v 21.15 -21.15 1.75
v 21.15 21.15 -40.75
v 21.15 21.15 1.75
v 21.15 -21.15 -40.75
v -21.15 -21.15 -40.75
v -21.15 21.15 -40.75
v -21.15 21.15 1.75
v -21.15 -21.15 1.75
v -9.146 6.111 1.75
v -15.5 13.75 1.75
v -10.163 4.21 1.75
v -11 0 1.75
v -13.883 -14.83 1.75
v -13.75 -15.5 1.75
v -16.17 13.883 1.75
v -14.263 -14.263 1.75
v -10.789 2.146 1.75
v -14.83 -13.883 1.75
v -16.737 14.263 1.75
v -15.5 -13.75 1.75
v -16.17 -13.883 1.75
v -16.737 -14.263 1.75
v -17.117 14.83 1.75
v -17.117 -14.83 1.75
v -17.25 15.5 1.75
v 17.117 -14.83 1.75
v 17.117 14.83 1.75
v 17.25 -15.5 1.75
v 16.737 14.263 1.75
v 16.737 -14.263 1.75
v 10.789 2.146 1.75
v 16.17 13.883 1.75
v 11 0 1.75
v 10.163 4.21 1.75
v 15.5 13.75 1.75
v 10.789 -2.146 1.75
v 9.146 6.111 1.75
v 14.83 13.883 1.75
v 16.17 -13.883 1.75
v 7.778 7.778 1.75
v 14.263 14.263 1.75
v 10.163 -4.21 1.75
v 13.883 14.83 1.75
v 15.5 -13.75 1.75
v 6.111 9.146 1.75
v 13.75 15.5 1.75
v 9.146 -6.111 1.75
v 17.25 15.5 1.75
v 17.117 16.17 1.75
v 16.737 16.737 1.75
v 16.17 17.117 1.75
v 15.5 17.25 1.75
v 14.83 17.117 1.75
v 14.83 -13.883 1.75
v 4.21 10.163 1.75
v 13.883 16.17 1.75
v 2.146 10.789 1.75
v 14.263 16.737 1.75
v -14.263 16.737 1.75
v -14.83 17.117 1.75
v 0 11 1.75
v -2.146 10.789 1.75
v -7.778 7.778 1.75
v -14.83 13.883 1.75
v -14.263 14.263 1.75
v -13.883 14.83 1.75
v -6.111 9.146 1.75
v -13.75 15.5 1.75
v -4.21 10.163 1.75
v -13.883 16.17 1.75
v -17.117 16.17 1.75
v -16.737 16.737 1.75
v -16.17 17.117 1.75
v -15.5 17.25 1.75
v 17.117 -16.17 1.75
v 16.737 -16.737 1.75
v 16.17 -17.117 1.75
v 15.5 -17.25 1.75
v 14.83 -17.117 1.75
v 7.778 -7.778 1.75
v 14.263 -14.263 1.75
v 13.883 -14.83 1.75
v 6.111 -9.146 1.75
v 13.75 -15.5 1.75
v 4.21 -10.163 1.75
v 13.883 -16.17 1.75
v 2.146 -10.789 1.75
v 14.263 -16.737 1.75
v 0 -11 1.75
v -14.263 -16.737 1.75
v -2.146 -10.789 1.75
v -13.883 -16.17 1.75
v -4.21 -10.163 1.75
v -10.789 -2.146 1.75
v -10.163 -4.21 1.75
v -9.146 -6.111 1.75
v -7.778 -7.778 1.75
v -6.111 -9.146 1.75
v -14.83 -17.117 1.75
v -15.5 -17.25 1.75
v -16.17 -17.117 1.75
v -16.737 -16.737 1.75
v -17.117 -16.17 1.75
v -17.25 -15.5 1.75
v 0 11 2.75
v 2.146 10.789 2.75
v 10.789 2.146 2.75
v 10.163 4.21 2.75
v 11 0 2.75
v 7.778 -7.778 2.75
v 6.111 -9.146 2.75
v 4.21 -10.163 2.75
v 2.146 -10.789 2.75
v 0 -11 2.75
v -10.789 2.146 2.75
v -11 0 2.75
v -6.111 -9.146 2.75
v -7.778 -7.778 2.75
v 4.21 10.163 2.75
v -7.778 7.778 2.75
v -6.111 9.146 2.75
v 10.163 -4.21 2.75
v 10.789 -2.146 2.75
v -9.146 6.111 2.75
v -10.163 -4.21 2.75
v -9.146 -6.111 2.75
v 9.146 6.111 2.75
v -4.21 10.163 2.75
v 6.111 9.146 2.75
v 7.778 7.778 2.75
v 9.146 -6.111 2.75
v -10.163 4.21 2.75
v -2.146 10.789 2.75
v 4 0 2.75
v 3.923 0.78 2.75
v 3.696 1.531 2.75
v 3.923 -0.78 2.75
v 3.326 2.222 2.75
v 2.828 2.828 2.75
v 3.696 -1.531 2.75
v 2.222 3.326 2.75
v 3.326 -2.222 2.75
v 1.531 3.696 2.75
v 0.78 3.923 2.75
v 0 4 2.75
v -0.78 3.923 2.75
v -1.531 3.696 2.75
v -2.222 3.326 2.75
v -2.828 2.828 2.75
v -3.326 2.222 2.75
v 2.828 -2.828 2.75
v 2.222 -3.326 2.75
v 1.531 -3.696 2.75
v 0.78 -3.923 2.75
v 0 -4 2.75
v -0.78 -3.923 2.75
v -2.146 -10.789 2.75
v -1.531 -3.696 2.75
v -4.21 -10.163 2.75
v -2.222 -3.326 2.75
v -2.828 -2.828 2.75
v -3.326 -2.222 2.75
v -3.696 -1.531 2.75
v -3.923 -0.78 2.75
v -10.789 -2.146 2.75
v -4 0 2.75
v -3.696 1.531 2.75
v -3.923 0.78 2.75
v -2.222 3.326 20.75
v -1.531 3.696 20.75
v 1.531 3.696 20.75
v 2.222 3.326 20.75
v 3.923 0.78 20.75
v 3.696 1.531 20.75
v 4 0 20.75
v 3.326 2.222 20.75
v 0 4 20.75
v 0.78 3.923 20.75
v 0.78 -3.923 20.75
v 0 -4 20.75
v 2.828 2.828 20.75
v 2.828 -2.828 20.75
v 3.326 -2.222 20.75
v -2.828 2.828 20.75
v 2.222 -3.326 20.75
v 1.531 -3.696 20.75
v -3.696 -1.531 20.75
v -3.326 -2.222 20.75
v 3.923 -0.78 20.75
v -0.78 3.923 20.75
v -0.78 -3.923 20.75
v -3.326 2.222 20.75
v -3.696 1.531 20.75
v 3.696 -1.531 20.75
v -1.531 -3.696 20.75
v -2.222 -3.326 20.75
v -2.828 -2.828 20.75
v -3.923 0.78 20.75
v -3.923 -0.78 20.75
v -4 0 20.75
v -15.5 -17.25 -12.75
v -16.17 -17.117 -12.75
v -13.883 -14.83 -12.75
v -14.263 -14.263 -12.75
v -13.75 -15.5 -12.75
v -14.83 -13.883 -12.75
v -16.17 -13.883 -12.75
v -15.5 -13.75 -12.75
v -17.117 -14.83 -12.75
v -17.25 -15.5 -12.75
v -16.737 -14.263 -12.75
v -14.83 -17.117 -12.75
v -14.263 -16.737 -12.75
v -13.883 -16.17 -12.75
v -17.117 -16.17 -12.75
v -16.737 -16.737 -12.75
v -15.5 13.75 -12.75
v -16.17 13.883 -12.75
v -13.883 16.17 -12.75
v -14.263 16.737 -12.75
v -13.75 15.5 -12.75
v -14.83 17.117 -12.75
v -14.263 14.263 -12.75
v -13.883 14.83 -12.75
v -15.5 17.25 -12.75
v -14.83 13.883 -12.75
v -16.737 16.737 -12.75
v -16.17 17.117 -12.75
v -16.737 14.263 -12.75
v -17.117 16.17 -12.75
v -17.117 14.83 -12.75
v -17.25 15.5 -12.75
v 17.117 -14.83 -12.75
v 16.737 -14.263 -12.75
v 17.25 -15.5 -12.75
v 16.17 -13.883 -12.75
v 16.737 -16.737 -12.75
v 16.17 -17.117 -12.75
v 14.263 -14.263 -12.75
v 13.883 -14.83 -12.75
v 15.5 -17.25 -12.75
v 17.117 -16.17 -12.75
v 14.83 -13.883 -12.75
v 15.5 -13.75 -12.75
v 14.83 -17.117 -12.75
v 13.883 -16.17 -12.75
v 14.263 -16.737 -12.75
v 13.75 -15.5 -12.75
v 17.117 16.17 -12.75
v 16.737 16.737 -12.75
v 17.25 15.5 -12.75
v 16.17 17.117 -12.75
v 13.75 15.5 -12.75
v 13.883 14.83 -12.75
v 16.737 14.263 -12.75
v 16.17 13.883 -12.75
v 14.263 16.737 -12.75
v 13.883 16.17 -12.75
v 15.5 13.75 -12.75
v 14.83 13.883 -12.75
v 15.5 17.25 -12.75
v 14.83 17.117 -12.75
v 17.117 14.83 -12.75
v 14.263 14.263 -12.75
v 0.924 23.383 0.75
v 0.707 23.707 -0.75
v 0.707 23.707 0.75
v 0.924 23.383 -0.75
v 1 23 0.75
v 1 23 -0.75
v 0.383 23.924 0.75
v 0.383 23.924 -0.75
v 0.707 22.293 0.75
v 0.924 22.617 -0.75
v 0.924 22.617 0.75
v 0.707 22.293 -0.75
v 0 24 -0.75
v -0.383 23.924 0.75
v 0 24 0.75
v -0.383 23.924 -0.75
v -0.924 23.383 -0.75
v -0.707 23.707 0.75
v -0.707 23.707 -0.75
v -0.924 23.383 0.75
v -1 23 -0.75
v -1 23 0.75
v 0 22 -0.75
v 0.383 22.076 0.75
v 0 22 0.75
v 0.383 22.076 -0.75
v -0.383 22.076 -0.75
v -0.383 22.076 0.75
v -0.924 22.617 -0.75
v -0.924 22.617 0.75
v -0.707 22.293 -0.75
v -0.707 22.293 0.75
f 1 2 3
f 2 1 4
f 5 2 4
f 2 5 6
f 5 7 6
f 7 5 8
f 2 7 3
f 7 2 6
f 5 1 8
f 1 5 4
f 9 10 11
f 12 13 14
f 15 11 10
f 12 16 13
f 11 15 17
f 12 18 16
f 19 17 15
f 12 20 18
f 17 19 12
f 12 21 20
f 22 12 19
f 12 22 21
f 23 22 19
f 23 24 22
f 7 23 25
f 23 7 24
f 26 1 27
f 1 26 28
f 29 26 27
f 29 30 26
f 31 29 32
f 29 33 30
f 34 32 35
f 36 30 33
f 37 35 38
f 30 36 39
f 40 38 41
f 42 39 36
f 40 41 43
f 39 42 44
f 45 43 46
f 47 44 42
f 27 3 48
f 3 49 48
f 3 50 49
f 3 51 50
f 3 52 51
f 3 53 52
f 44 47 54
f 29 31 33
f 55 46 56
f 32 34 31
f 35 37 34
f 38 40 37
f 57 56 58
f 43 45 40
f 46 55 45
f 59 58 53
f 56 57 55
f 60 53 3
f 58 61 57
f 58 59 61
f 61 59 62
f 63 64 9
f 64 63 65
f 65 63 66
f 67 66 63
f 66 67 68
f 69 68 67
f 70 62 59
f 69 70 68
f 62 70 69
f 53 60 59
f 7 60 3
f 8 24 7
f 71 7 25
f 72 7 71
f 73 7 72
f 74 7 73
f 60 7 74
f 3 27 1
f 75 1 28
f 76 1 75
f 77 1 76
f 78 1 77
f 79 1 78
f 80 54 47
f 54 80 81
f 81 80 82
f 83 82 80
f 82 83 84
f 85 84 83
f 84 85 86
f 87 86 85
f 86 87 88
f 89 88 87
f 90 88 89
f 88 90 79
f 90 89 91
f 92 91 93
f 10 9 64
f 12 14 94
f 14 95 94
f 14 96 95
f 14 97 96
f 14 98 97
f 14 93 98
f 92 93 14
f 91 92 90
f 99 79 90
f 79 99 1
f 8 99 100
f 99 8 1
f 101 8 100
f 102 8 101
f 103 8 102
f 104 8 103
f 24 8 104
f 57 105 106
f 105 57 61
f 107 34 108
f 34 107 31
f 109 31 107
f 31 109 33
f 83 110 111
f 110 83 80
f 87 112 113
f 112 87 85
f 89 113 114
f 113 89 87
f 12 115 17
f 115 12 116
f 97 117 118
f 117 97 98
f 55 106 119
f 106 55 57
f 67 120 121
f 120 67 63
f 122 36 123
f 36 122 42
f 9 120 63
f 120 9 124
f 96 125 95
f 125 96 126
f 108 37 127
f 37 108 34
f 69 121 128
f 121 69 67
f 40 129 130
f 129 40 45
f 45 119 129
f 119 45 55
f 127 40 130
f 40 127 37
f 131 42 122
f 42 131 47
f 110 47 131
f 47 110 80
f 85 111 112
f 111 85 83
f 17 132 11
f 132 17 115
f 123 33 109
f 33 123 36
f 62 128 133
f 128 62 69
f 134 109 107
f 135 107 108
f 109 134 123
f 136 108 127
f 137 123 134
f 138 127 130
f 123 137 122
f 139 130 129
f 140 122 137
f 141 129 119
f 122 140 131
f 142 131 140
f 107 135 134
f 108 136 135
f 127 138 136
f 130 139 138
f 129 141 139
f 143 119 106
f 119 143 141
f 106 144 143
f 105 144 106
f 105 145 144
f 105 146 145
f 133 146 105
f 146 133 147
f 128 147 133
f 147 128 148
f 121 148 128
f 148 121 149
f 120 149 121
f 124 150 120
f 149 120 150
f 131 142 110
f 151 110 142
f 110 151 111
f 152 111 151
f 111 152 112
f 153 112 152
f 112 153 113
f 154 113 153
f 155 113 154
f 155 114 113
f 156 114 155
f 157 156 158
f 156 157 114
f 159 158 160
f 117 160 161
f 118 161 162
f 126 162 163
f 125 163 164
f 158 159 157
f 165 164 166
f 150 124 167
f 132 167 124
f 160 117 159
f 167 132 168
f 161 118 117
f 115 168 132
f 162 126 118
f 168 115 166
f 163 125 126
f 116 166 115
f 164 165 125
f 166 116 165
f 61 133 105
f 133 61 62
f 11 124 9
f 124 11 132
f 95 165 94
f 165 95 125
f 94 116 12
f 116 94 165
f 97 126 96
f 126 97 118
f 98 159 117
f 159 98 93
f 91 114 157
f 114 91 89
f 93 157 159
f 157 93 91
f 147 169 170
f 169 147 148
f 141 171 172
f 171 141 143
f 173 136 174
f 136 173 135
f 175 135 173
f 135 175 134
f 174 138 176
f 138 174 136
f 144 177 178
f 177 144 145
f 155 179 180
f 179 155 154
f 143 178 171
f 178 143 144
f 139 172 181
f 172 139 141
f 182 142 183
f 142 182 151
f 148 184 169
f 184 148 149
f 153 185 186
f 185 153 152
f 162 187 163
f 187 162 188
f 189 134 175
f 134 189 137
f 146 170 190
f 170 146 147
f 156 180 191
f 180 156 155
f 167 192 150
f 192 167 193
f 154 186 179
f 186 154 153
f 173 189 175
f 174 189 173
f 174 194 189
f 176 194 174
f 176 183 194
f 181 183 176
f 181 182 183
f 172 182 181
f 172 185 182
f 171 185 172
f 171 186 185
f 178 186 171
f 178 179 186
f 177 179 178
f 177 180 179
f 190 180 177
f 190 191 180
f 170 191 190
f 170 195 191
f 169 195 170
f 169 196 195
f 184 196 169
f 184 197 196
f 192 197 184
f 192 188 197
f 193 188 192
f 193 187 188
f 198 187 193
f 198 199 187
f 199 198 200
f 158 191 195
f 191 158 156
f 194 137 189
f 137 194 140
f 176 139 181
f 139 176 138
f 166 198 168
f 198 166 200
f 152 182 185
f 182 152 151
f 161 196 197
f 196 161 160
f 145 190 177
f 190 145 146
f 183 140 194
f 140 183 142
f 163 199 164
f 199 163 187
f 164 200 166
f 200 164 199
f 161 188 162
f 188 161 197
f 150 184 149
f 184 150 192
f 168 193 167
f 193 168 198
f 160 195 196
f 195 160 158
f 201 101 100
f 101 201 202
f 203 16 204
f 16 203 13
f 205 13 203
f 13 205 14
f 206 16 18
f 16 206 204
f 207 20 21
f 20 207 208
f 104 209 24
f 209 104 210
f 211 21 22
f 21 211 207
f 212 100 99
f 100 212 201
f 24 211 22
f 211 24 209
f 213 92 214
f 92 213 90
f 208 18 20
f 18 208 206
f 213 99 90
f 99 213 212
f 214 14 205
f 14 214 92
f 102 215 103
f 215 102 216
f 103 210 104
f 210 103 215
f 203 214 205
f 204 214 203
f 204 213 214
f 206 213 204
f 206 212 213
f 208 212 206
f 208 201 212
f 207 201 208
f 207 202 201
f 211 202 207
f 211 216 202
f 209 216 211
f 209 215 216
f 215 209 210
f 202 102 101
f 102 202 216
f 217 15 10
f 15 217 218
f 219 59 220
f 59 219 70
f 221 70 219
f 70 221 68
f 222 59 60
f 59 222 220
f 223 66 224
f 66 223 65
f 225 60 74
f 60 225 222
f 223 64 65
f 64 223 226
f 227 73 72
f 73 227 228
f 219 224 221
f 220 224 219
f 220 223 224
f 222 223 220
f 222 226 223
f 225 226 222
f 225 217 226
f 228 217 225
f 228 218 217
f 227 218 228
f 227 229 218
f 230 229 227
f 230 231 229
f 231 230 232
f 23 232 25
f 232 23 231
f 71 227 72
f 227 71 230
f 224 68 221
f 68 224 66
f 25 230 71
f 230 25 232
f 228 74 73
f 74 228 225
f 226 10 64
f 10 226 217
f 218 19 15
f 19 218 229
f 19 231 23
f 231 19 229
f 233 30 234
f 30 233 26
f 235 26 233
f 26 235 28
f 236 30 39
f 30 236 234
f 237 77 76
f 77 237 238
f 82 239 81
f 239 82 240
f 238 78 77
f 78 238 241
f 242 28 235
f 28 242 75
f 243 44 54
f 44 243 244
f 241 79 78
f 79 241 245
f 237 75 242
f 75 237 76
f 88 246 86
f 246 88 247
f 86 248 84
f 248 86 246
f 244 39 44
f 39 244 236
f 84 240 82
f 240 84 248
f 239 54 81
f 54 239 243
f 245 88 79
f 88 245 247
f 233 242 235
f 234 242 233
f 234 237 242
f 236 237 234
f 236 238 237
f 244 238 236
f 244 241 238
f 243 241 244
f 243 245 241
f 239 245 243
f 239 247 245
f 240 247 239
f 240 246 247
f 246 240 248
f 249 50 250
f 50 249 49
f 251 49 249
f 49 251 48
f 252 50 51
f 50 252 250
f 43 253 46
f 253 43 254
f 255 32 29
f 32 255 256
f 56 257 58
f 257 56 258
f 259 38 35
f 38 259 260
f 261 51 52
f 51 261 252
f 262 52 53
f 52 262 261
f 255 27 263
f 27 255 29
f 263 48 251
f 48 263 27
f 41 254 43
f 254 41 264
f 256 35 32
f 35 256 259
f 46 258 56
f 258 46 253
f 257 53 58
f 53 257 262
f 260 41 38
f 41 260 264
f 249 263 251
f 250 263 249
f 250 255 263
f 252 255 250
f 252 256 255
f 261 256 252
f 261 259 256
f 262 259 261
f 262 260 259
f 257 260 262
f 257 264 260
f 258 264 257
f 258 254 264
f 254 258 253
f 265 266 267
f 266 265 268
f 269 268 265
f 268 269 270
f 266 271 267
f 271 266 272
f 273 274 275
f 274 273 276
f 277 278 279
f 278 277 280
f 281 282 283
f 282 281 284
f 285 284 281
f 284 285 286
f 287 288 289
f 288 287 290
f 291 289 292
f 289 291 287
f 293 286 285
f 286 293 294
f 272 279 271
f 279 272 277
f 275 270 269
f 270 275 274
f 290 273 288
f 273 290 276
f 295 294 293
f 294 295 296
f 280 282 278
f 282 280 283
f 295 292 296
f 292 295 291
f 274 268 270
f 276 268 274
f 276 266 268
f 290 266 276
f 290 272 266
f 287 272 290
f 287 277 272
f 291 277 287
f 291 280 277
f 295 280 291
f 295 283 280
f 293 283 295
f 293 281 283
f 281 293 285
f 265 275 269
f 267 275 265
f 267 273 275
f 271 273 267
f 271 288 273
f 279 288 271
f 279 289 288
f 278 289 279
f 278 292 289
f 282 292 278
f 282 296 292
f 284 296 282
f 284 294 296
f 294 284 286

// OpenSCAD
// Parameters
face_width = 42.3; //[21.15:84.6:0.1]
face_thickness = 3.5; //[1.75:7:0.1]
body_length = 40; //[20:80:0.5]
body_width = 42.3; //[21.15:84.6:0.1]
body_height = 42.3; //[21.15:84.6:0.1]
shaft_diameter = 8; //[4:16:0.1]
shaft_length = 20; //[10:40:0.5]
shaft_boss_diameter = 22; //[11:44:0.1]
shaft_boss_height = 2; //[1:6:0.1]
mounting_hole_spacing = 31; //[15.5:62:0.1]
mounting_hole_diameter = 3.5; //[2:6:0.1]
mounting_hole_depth = 10; //[5:25:0.5]
mounting_hole_extra_through = 2; //[1:6:0.5]
overlap = 1; //[0.5:2:0.1]
pattern_marker_diameter = 2; //[1:5:0.1]
pattern_marker_height = 1.5; //[0.5:4:0.1]
ttrack_length = 60; //[30:120:1]
ttrack_pitch = 20; //[10:40:1]
ttrack_edge_clearance = 7; //[3:15:0.5]
ttrack_insert_hole_count = 3; //[1:8:1]
rail_hole_spacing = 25; //[10:60:1]
grill_hole_spacing = 8; //[4:16:0.5]

// Motor Shaft
module motor_shaft() {
  color("Silver") {
    translate([0, 0, face_thickness/2 + shaft_length/2 - overlap])
      cylinder(r=shaft_diameter/2, h=shaft_length, center=true, $fn=32);
  }
}

// Ttrack Hole Positions
module ttrack_hole_positions() {
  color("DimGray") {
    for (i = [0:ttrack_insert_hole_count-1]) {
      translate([0, ttrack_length/2 - ttrack_edge_clearance - i*ttrack_pitch, 0])
        cylinder(r=pattern_marker_diameter/2, h=pattern_marker_height, center=true, $fn=16);
    }
  }
}

// Ttrack Insert Hole Positions
module ttrack_insert_hole_positions() {
  color("DimGray") {
    for (i = [1:ttrack_insert_hole_count]) {
      translate([ttrack_length/2 - i*(ttrack_length/(ttrack_insert_hole_count+1)), 0, 0])
        cylinder(r=pattern_marker_diameter/2, h=pattern_marker_height, center=true, $fn=16);
    }
  }
}

// Rail Hole Positions
module rail_hole_positions() {
  color("DimGray") {
    translate([body_width/2 - pattern_marker_diameter/2, rail_hole_spacing/2, 0])
      cylinder(r=pattern_marker_diameter/2, h=pattern_marker_height, center=true, $fn=16);
    translate([body_width/2 - pattern_marker_diameter/2, -rail_hole_spacing/2, 0])
      cylinder(r=pattern_marker_diameter/2, h=pattern_marker_height, center=true, $fn=16);
  }
}

// Grill Hole Positions
module grill_hole_positions() {
  color("DimGray") {
    for (x = [-1, 1]) {
      for (y = [-1, 1]) {
        translate([x*grill_hole_spacing/2, y*grill_hole_spacing/2, 0])
          cylinder(r=pattern_marker_diameter/2, h=pattern_marker_height, center=true, $fn=16);
      }
    }
  }
}

// Motor Body with Mounting Holes
module motor_with_mounting_holes() {
  color("Black") {
    difference() {
      union() {
        // Motor Body
        translate([0, 0, -(face_thickness/2 + body_length/2 - overlap)])
          cube([body_width, body_height, body_length], center=true);
        // Front Face Plate
        translate([0, 0, 0])
          cube([face_width, face_width, face_thickness], center=true);
        // Shaft Boss
        translate([0, 0, face_thickness/2 + shaft_boss_height/2 - overlap])
          cylinder(r=shaft_boss_diameter/2, h=shaft_boss_height, center=true, $fn=32);
        // Motor Shaft
        motor_shaft();
      }
      // Mounting Holes
      for (x = [-1, 1]) {
        for (y = [-1, 1]) {
          translate([x*mounting_hole_spacing/2, y*mounting_hole_spacing/2, -(mounting_hole_depth/2)])
            cylinder(r=mounting_hole_diameter/2, h=face_thickness + mounting_hole_depth + mounting_hole_extra_through, center=true, $fn=16);
        }
      }
    }
  }
}

// Assembly
module assembly() {
  motor_with_mounting_holes();
  ttrack_hole_positions();
  ttrack_insert_hole_positions();
  rail_hole_positions();
  grill_hole_positions();
}

assembly();
